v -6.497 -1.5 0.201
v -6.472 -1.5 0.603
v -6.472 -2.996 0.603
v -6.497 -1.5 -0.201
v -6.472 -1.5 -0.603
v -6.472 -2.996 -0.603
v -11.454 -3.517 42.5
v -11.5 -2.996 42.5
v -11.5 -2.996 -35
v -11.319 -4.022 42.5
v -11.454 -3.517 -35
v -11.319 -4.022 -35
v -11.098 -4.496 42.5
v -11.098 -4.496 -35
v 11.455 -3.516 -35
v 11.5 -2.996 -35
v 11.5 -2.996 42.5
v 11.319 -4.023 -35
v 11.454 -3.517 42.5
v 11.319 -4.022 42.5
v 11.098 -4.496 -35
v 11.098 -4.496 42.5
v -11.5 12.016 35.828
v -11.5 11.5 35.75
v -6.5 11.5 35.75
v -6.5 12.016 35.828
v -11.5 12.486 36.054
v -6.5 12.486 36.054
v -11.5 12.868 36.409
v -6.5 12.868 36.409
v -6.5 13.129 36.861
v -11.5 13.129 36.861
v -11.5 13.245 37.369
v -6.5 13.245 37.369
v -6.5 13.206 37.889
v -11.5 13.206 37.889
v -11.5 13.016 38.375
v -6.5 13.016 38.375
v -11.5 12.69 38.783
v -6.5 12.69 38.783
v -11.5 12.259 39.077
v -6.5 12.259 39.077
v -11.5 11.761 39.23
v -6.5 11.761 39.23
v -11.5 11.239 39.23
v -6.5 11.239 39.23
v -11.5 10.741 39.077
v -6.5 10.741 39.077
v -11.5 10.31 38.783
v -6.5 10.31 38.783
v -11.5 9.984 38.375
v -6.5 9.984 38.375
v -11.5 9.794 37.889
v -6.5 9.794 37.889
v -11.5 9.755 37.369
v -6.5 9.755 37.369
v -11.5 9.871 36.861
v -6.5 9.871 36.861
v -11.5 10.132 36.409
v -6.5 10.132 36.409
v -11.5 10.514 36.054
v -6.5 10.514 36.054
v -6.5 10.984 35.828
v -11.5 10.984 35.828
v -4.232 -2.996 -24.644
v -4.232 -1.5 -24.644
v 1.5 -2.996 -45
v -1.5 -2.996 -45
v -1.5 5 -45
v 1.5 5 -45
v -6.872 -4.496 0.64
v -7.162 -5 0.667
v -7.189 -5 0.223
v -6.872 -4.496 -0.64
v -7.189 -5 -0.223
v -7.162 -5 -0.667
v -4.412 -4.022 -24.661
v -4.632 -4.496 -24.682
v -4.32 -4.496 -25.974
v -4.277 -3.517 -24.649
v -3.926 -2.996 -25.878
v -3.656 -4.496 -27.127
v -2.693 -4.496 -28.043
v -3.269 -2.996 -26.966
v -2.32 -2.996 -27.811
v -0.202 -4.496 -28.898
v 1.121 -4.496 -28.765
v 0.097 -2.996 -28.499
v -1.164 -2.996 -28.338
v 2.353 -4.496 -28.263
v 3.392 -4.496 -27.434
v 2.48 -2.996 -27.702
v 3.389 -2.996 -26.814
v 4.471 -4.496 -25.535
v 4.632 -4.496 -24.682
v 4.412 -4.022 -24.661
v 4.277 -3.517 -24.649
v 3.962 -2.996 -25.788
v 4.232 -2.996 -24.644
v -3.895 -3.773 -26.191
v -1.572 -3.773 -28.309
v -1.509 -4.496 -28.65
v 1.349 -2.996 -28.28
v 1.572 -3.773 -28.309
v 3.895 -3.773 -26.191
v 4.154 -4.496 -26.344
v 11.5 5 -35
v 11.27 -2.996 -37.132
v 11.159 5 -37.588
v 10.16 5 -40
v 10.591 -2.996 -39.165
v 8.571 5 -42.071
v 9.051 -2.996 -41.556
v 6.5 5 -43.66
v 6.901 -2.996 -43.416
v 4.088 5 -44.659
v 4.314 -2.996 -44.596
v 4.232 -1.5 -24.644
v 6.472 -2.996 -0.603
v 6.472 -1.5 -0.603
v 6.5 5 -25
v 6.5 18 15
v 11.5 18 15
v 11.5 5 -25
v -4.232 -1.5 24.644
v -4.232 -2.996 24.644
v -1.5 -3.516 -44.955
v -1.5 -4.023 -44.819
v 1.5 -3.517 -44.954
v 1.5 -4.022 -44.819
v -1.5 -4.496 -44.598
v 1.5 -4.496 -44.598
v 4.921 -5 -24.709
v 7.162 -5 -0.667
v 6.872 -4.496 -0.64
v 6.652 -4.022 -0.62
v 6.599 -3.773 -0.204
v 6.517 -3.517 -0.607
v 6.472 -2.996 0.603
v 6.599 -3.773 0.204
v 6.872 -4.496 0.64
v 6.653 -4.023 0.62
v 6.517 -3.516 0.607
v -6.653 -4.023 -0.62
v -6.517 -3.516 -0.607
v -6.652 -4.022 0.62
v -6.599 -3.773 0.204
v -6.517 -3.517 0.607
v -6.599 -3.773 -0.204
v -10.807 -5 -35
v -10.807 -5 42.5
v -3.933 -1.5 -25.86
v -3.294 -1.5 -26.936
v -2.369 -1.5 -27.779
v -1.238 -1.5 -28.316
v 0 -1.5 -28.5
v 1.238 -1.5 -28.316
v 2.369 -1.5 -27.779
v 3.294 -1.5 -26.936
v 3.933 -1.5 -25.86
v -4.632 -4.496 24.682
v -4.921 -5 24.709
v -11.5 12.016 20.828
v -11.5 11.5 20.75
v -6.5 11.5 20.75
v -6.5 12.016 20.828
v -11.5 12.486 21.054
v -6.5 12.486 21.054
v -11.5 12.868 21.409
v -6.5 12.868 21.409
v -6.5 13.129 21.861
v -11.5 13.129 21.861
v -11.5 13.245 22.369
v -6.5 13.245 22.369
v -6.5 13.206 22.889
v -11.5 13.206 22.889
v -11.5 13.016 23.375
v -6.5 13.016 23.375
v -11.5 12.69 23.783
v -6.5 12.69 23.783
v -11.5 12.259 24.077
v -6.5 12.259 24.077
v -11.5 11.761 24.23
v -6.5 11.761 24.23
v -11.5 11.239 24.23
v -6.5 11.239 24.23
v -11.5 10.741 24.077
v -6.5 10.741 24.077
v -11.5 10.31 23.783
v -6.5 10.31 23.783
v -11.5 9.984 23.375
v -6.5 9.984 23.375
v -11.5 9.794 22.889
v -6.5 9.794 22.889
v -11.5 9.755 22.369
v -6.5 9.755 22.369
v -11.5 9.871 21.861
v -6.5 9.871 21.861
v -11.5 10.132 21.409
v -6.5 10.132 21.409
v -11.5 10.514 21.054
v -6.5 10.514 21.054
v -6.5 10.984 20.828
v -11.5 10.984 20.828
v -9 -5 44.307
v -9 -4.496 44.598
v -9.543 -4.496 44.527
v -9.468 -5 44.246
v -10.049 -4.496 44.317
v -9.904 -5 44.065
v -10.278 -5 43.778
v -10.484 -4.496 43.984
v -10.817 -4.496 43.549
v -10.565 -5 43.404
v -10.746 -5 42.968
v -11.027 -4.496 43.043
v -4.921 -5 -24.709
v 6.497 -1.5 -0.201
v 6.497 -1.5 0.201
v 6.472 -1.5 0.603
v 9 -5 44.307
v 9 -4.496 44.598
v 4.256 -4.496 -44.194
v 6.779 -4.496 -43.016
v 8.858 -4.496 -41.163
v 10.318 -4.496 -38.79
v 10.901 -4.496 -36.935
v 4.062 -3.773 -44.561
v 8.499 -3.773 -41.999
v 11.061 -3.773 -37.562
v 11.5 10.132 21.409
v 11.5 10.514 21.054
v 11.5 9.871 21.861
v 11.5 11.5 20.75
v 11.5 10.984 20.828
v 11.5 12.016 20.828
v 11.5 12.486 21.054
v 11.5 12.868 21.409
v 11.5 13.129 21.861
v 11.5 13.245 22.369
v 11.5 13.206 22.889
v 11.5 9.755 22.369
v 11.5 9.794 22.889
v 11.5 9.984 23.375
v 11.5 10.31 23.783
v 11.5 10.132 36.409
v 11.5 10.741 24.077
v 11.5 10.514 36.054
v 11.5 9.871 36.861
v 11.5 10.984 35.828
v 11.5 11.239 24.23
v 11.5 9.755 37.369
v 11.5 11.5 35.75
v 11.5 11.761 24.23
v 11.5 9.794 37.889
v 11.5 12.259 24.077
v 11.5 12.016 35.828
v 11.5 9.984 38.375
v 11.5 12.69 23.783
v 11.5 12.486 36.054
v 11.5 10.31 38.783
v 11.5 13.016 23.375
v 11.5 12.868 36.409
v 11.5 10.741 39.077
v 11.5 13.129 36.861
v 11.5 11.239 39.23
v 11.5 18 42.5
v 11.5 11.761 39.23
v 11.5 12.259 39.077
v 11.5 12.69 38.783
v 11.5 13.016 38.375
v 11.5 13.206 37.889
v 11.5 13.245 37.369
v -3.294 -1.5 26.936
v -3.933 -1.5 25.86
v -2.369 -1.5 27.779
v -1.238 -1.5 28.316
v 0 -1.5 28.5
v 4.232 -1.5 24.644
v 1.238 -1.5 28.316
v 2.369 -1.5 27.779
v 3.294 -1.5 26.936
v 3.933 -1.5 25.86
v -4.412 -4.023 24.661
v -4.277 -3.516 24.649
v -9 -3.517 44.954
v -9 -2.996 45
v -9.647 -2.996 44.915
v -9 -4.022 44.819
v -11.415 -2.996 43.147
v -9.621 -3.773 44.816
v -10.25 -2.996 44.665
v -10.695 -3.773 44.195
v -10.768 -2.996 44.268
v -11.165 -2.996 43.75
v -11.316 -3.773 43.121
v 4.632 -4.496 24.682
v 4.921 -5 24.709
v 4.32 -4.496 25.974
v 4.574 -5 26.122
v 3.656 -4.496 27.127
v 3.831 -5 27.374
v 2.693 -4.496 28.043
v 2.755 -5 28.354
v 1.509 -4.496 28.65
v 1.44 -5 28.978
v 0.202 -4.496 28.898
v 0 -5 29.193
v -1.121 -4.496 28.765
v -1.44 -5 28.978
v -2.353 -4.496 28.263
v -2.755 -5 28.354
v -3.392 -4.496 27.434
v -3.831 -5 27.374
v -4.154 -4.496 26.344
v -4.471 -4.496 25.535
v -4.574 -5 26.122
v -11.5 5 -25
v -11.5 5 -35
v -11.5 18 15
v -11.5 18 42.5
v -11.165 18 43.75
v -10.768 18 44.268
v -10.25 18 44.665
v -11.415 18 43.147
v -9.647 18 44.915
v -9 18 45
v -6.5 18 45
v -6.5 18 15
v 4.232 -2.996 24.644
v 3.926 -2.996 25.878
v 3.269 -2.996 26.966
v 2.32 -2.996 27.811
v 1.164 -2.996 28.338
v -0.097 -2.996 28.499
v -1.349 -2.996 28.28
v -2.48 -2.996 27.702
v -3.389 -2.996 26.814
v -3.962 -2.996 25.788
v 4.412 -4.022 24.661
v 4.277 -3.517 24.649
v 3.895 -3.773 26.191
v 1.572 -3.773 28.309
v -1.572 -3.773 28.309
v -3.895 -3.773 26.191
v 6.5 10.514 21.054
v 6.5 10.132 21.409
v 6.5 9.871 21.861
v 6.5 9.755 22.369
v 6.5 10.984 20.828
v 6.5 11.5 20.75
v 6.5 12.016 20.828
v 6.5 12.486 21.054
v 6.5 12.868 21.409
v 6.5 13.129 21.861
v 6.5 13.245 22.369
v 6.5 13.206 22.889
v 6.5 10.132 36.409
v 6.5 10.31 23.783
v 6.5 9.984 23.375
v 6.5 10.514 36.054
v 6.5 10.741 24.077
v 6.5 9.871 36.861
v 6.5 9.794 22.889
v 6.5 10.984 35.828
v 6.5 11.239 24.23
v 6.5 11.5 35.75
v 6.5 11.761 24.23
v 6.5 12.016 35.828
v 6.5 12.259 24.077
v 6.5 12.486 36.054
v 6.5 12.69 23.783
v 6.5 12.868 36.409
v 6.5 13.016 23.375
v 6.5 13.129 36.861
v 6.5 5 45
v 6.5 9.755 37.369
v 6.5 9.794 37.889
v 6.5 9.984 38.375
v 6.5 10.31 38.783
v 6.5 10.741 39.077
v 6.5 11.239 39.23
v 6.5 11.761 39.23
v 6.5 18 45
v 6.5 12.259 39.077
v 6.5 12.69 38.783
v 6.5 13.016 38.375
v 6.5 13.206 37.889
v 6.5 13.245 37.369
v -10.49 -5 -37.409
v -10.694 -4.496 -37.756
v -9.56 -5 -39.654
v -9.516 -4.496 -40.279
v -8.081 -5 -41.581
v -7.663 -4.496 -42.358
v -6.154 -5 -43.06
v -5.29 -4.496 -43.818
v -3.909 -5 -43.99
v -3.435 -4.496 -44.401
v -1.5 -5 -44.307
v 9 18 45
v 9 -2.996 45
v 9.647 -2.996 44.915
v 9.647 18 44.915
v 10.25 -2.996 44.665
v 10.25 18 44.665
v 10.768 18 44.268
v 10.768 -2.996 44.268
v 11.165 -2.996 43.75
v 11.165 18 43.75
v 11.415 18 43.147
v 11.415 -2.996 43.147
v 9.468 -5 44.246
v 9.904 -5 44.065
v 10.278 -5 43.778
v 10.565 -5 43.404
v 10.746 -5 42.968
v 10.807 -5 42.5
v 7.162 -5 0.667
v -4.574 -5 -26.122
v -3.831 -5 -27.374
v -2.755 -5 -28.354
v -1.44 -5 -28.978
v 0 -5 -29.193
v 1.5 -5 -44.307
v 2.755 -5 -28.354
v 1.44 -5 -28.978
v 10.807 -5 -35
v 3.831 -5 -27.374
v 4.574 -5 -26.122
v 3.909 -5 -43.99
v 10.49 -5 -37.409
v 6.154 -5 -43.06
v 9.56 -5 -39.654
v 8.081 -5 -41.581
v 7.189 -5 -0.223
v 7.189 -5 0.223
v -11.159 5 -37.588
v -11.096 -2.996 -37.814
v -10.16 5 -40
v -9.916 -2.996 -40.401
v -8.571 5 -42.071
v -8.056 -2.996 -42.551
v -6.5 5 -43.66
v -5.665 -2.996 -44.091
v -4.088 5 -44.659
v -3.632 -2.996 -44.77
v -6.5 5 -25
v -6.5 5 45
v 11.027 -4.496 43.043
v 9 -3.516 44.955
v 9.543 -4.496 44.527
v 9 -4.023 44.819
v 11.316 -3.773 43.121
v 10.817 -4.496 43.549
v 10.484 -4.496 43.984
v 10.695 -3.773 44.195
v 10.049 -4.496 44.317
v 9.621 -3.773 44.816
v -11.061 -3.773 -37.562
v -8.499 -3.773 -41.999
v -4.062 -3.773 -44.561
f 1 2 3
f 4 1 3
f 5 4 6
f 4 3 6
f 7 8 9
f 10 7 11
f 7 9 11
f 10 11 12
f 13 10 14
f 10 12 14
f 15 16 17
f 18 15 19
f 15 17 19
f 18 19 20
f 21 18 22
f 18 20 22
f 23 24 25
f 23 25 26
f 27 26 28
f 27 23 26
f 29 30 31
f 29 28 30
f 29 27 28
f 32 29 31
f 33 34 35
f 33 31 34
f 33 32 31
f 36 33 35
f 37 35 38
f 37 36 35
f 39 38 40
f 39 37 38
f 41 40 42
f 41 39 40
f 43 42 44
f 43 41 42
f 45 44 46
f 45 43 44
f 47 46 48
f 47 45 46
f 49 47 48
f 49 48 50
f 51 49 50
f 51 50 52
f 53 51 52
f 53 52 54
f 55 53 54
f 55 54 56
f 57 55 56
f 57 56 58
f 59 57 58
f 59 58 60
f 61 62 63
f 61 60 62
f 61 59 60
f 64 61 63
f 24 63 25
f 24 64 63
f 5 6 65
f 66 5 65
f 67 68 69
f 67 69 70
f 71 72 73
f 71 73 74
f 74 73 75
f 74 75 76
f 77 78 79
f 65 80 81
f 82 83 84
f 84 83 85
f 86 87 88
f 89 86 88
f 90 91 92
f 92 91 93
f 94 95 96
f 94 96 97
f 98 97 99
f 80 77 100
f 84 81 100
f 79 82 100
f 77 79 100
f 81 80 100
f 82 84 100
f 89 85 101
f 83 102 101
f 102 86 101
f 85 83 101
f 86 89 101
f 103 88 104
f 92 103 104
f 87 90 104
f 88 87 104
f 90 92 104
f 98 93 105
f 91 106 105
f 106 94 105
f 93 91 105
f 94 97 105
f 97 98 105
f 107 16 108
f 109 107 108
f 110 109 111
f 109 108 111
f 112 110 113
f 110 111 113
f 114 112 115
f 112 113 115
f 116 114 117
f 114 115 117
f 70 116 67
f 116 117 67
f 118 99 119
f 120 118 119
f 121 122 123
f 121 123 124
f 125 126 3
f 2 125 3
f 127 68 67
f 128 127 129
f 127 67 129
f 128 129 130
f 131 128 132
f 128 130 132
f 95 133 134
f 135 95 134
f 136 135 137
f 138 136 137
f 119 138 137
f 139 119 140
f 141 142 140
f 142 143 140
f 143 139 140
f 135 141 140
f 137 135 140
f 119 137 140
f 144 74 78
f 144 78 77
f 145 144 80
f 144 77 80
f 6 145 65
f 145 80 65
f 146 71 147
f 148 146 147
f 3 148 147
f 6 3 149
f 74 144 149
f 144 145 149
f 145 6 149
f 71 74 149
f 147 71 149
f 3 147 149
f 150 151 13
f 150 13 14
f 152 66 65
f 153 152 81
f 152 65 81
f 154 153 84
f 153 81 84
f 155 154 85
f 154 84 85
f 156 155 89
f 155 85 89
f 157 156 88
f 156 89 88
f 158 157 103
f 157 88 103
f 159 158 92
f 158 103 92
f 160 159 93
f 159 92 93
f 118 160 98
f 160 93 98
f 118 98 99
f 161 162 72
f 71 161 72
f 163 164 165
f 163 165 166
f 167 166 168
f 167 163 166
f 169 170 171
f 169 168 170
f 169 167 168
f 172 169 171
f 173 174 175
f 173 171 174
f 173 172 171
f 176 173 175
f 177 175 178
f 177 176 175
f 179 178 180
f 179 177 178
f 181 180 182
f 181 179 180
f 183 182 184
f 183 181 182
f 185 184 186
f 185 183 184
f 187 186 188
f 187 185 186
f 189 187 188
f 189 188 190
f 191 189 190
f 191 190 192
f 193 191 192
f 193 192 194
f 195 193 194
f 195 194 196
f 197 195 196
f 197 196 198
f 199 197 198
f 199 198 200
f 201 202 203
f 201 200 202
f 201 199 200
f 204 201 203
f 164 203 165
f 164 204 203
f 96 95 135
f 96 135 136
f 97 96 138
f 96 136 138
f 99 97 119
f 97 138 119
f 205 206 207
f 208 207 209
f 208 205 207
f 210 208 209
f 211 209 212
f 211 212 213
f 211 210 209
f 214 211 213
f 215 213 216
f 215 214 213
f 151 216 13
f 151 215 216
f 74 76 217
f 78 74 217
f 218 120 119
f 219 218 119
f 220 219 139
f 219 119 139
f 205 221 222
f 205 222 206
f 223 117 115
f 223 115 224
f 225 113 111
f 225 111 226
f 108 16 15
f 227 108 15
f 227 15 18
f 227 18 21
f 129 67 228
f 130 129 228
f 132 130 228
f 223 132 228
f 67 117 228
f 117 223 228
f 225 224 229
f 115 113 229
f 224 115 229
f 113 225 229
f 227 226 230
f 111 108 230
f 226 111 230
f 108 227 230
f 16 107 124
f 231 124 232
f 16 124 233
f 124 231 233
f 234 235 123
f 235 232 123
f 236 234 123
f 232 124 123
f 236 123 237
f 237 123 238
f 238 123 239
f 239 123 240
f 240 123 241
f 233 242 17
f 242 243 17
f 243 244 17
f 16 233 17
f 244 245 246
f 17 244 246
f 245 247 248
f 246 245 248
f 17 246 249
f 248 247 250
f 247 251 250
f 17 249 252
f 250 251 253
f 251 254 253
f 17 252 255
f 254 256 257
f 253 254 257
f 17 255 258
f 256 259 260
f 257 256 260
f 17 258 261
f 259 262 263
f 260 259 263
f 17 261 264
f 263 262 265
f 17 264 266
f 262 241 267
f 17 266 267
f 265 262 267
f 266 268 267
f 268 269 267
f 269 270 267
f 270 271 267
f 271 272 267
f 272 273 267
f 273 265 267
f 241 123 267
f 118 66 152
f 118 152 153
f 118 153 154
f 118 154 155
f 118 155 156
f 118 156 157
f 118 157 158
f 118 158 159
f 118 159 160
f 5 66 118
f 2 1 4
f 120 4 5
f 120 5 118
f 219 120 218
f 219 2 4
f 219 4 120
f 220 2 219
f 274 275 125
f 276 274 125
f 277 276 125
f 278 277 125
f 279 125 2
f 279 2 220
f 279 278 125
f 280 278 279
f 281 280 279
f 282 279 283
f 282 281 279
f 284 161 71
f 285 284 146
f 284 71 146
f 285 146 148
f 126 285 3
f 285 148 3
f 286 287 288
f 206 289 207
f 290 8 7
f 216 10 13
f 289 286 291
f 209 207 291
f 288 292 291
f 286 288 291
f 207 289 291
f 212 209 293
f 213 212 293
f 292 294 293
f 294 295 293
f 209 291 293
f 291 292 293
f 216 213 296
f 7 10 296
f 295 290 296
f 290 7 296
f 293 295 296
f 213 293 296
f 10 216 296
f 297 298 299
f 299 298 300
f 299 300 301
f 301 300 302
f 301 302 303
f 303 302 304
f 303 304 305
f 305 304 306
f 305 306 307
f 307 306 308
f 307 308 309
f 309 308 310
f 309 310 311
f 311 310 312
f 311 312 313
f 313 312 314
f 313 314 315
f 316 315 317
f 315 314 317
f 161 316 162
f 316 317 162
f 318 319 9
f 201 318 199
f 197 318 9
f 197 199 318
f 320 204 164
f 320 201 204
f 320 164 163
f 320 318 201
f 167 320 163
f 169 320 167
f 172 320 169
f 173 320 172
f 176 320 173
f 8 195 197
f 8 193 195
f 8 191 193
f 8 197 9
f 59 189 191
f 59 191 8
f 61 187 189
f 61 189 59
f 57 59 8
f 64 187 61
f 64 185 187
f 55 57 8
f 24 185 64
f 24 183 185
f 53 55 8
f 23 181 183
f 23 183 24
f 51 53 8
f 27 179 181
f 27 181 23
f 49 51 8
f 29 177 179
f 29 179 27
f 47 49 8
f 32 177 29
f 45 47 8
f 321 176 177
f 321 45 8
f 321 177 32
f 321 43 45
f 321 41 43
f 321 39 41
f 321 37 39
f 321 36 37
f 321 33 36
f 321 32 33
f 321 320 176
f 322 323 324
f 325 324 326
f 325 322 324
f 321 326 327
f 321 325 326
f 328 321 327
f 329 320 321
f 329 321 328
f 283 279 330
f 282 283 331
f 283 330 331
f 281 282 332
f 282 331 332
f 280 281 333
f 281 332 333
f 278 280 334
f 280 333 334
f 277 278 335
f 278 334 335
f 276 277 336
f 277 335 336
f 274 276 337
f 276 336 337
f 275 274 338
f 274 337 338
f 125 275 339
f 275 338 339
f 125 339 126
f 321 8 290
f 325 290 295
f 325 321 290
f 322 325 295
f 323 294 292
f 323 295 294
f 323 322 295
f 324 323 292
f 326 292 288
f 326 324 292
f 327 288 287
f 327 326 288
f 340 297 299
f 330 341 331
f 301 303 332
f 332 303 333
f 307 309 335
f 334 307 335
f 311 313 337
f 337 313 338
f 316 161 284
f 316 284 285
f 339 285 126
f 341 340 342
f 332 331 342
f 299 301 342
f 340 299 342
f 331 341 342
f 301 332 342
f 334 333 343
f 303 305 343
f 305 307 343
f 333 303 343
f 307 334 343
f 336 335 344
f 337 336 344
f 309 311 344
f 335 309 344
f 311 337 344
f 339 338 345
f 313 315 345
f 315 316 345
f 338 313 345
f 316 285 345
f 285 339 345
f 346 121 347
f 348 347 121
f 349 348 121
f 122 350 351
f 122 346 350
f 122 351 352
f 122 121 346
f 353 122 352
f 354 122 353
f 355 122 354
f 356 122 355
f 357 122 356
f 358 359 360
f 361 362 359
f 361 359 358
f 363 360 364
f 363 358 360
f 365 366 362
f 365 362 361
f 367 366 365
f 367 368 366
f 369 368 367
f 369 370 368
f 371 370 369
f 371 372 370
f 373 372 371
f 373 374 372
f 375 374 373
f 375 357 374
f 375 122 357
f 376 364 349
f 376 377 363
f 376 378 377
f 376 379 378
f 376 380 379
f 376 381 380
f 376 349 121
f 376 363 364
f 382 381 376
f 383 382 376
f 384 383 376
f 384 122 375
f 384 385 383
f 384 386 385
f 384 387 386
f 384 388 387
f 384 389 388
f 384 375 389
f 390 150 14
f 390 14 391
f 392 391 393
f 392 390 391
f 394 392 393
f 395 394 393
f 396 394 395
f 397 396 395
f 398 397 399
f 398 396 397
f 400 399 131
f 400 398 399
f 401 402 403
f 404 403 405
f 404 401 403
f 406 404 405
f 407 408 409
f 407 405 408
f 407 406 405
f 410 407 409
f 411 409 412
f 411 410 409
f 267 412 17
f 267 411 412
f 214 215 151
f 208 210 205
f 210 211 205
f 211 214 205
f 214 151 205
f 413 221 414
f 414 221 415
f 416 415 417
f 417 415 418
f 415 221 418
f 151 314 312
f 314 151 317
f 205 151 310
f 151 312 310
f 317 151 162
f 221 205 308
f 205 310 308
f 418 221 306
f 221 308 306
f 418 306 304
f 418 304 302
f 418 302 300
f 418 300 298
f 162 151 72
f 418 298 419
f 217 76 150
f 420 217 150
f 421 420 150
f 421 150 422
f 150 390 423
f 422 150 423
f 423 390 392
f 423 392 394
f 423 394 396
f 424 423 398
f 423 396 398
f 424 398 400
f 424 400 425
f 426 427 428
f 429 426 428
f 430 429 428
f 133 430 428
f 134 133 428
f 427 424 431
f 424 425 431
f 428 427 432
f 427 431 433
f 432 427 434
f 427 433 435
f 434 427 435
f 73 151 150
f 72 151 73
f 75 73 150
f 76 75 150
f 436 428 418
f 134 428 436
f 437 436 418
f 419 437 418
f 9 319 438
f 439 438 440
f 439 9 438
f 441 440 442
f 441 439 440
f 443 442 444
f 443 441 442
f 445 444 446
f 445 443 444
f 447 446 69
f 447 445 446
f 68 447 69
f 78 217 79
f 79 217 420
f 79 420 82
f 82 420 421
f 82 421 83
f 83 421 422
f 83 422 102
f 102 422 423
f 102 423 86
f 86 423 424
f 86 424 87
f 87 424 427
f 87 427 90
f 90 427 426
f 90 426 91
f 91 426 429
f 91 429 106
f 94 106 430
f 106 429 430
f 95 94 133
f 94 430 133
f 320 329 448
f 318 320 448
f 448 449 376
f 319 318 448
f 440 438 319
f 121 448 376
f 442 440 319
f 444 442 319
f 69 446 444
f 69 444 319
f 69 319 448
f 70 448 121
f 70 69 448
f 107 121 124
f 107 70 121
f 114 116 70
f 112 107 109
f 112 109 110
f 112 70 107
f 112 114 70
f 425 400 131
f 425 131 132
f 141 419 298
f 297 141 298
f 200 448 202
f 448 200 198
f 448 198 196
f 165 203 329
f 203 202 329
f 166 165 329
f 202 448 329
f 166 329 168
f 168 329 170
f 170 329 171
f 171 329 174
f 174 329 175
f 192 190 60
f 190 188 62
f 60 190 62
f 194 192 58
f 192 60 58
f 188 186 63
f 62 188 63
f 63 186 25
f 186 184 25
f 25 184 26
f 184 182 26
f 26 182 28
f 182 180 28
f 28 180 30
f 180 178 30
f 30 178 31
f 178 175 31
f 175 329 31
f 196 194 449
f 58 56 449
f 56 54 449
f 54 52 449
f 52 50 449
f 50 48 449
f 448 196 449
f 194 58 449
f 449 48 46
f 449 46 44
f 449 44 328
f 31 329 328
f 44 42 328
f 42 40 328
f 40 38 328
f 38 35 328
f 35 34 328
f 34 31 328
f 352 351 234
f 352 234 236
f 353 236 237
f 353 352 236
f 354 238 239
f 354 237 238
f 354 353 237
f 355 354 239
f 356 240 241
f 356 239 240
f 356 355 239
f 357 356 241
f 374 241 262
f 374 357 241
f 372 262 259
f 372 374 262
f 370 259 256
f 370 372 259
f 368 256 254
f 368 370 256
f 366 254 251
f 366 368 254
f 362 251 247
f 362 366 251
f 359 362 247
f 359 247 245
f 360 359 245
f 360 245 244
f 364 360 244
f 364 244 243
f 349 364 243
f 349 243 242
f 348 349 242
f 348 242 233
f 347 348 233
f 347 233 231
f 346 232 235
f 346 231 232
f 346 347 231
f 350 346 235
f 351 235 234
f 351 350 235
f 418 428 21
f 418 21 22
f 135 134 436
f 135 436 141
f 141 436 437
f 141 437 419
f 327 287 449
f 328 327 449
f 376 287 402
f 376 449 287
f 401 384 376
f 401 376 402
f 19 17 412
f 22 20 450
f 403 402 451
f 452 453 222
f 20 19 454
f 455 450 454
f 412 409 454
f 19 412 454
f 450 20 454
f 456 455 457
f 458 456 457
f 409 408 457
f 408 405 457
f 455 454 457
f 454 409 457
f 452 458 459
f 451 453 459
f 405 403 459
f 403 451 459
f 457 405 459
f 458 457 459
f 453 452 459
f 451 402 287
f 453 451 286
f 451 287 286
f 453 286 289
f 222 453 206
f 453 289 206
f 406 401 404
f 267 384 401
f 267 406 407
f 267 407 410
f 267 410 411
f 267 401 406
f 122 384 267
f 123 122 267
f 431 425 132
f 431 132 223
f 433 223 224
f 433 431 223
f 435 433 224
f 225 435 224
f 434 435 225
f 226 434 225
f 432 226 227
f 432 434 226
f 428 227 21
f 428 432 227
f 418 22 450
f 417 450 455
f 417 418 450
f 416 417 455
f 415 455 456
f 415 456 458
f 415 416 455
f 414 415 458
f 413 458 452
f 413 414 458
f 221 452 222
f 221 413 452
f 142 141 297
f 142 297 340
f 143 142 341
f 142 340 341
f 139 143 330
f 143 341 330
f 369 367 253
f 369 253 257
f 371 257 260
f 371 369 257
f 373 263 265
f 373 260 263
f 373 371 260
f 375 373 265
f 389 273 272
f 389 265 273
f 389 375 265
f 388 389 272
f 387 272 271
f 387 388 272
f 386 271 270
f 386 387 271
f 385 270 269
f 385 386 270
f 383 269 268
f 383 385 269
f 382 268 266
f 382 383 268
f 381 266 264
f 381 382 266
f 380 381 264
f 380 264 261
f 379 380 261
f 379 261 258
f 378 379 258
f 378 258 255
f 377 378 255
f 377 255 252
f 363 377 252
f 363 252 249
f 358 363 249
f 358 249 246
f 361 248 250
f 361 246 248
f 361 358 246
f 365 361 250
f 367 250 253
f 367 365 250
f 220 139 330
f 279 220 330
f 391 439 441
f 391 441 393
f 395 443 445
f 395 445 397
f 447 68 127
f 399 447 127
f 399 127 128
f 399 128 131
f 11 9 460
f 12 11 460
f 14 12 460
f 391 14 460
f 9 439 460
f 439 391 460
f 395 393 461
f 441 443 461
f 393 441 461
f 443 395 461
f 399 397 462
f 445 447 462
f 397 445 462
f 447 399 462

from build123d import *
from OCP.BRepFilletAPI import BRepFilletAPI_MakeChamfer

# Parameters (mm, degrees)
SKETCH_1_W               = 23
SKETCH_1_H               = 90
EXTRUDE_1_DEPTH          = 5
SKETCH_2_R               = 4.25
SKETCH_2_R_2             = 6.5
CUT_EXTRUDE_1_DEPTH      = 3.5
EXTRUDE_START            = 15
SKETCH_4_W               = 5
SKETCH_4_H               = 13
EXTRUDE_3_DEPTH          = 30
FILLET_2_R               = 10
CUT_EXTRUDE_2_DEPTH      = 50.812147113
CUT_EXTRUDE_2_DEPTH_BACK = 50.812147113
SKETCH_5_R               = 1.75
FILLET_3_R               = 2.5
EXTRUDE_START_2          = 6.5
EXTRUDE_4_DEPTH          = 5
CHAMFER_1_SIZE           = 1.2
CHAMFER_1_SIZE2          = 0.692820323
FILLET_4_R               = 3


with BuildPart() as part:
    # 스케치1 → 보스-돌출1 (new, symmetric)
    with BuildSketch(Plane(origin=(0, 0, 0), x_dir=(1, 0, 0), z_dir=(0, 1, 0))):
        Rectangle(SKETCH_1_W, SKETCH_1_H)
    extrude(amount=EXTRUDE_1_DEPTH, both=True)

    # 스케치2 → 컷-돌출1 (cut)
    with BuildSketch(Plane.XZ.offset(5)):
        with Locations((0, 24.25)):
            Circle(SKETCH_2_R)
        with BuildLine():
            ThreePointArc((4.25, 24.25), (-0.19737792, 20.004585773), (-4.231666803, 24.644329897))
            Line((-4.231666803, 24.644329897), (-6.471960993, 0.603092784))
            ThreePointArc((-6.471960993, 0.603092784), (0, 6.5), (6.471960993, 0.603092784))
            Line((6.471960993, 0.603092784), (4.231666803, 24.644329897))
            ThreePointArc((4.231666803, 24.644329897), (4.245414227, 24.44737792), (4.25, 24.25))
        make_face()
        Circle(SKETCH_2_R_2)
        with BuildLine():
            ThreePointArc((6.471960993, -0.603092784), (0, -6.5), (-6.471960993, -0.603092784))
            Line((-6.471960993, -0.603092784), (-4.231666803, -24.644329897))
            ThreePointArc((-4.231666803, -24.644329897), (-0.19737792, -20.004585773), (4.25, -24.25))
            ThreePointArc((4.25, -24.25), (4.245414227, -24.44737792), (4.231666803, -24.644329897))
            Line((4.231666803, -24.644329897), (6.471960993, -0.603092784))
        make_face()
        with Locations((0, -24.25)):
            Circle(SKETCH_2_R)
    extrude(amount=-CUT_EXTRUDE_1_DEPTH, mode=Mode.SUBTRACT)

    # 스케치4 → 보스-돌출3 (add)
    with BuildSketch(Plane.XY.offset(EXTRUDE_START)):
        with Locations((-9, 11.5)):
            Rectangle(SKETCH_4_W, SKETCH_4_H)
        with Locations((9, 11.5)):
            Rectangle(SKETCH_4_W, SKETCH_4_H)
    extrude(amount=EXTRUDE_3_DEPTH)

    # 필렛2
    fillet_2_edges = [part.edges().sort_by_distance(p)[0] for p in [
        (-11.5, 0, -45),
        (11.5, 0, -45),
    ]]
    fillet(fillet_2_edges, radius=FILLET_2_R)

    # 스케치5 → 컷-돌출2 (cut, two sides: drawn at the far end of the back side and taken through both)
    with BuildSketch(Plane(origin=(0, 0, 0), x_dir=(0, 0, -1), z_dir=(1, 0, 0)).offset(-CUT_EXTRUDE_2_DEPTH_BACK)):
        with Locations((-22.5, 11.5)):
            Circle(SKETCH_5_R)
        with Locations((-37.5, 11.5)):
            Circle(SKETCH_5_R)
    extrude(amount=CUT_EXTRUDE_2_DEPTH + CUT_EXTRUDE_2_DEPTH_BACK, mode=Mode.SUBTRACT)

    # 필렛3
    fillet_3_edges = [part.edges().sort_by_distance(p)[0] for p in [
        (11.5, 6.5, 45),
        (-11.5, 6.5, 45),
    ]]
    fillet(fillet_3_edges, radius=FILLET_3_R)

    # 스케치6 → 보스-돌출4 (add)
    with BuildSketch(Plane(origin=(0, 0, 0), x_dir=(0, 0, -1), z_dir=(1, 0, 0)).offset(EXTRUDE_START_2)):
        Polygon((-15, 18), (25, 5), (-15, 5), align=None)
    extrude_4 = extrude(amount=EXTRUDE_4_DEPTH)

    # 대칭 복사1: 보스-돌출4 across plane
    add(extrude_4.mirror(Plane(origin=(0, 0, 0), x_dir=(0, 0, 1), z_dir=(1, 0, 0))))

    # 모따기1: one chamfer whose edges measure the first distance from different faces: ONE call of the kernel's chamfer builder (chamfer() names one face for all edges)
    chamfer_1_edges_1 = [part.edges().sort_by_distance(p)[0] for p in [
        (5.351813898, -5, 12.62371134),
    ]]
    chamfer_1_side_1 = [part.faces().sort_by_distance(p)[0] for p in [
        (5.351813898, -3.25, 12.62371134),
    ]]
    chamfer_1_edges_2 = [part.edges().sort_by_distance(p)[0] for p in [
        (5.351813898, -5, -12.62371134),
    ]]
    chamfer_1_side_2 = [part.faces().sort_by_distance(p)[0] for p in [
        (5.351813898, -3.25, -12.62371134),
    ]]
    chamfer_1_edges_3 = [part.edges().sort_by_distance(p)[0] for p in [
        (0, -5, 28.5),
    ]]
    chamfer_1_side_3 = [part.faces().sort_by_distance(p)[0] for p in [
        (0, -3.25, 28.5),
    ]]
    chamfer_1_edges_4 = [part.edges().sort_by_distance(p)[0] for p in [
        (-5.351813898, -5, 12.62371134),
    ]]
    chamfer_1_side_4 = [part.faces().sort_by_distance(p)[0] for p in [
        (-5.351813898, -3.25, 12.62371134),
    ]]
    chamfer_1_edges_5 = [part.edges().sort_by_distance(p)[0] for p in [
        (-6.5, -5, 0),
    ]]
    chamfer_1_side_5 = [part.faces().sort_by_distance(p)[0] for p in [
        (-6.5, -3.25, 0),
    ]]
    chamfer_1_edges_6 = [part.edges().sort_by_distance(p)[0] for p in [
        (-5.351813898, -5, -12.62371134),
    ]]
    chamfer_1_side_6 = [part.faces().sort_by_distance(p)[0] for p in [
        (-5.351813898, -3.25, -12.62371134),
    ]]
    chamfer_1_edges_7 = [part.edges().sort_by_distance(p)[0] for p in [
        (0, -5, -28.5),
    ]]
    chamfer_1_side_7 = [part.faces().sort_by_distance(p)[0] for p in [
        (0, -3.25, -28.5),
    ]]
    chamfer_1_edges_8 = [part.edges().sort_by_distance(p)[0] for p in [
        (6.5, -5, 0),
    ]]
    chamfer_1_side_8 = [part.faces().sort_by_distance(p)[0] for p in [
        (6.5, -3.25, 0),
    ]]
    chamfer_1_edges_9 = [part.edges().sort_by_distance(p)[0] for p in [
        (0, -5, -45),
    ]]
    chamfer_1_side_9 = [part.faces().sort_by_distance(p)[0] for p in [
        (0, 0, -45),
    ]]
    chamfer_1_edges_10 = [part.edges().sort_by_distance(p)[0] for p in [
        (-11.5, -5, 3.75),
    ]]
    chamfer_1_side_10 = [part.faces().sort_by_distance(p)[0] for p in [
        (-11.5, 4.599741569, 9.495989177),
    ]]
    chamfer_1_edges_11 = [part.edges().sort_by_distance(p)[0] for p in [
        (-8.571067812, -5, -42.071067812),
    ]]
    chamfer_1_side_11 = [part.faces().sort_by_distance(p)[0] for p in [
        (-8.571067812, 0, -42.071067812),
    ]]
    chamfer_1_edges_12 = [part.edges().sort_by_distance(p)[0] for p in [
        (8.571067812, -5, -42.071067812),
    ]]
    chamfer_1_side_12 = [part.faces().sort_by_distance(p)[0] for p in [
        (8.571067812, 0, -42.071067812),
    ]]
    chamfer_1_edges_13 = [part.edges().sort_by_distance(p)[0] for p in [
        (0, -5, 45),
    ]]
    chamfer_1_side_13 = [part.faces().sort_by_distance(p)[0] for p in [
        (0, 3.051020408, 45),
    ]]
    chamfer_1_edges_14 = [part.edges().sort_by_distance(p)[0] for p in [
        (11.5, -5, 3.75),
    ]]
    chamfer_1_side_14 = [part.faces().sort_by_distance(p)[0] for p in [
        (11.5, 4.599741569, 9.495989177),
    ]]
    chamfer_1_edges_15 = [part.edges().sort_by_distance(p)[0] for p in [
        (10.767766953, -5, 44.267766953),
    ]]
    chamfer_1_side_15 = [part.faces().sort_by_distance(p)[0] for p in [
        (10.767766953, 6.5, 44.267766953),
    ]]
    chamfer_1_edges_16 = [part.edges().sort_by_distance(p)[0] for p in [
        (-10.767766953, -5, 44.267766953),
    ]]
    chamfer_1_side_16 = [part.faces().sort_by_distance(p)[0] for p in [
        (-10.767766953, 6.5, 44.267766953),
    ]]
    chamfer_1 = BRepFilletAPI_MakeChamfer(part.part.solid().wrapped)
    for e in chamfer_1_edges_1:
        chamfer_1.Add(CHAMFER_1_SIZE, CHAMFER_1_SIZE2, e.wrapped, chamfer_1_side_1[0].wrapped)  # the first distance lies on this face
    for e in chamfer_1_edges_2:
        chamfer_1.Add(CHAMFER_1_SIZE, CHAMFER_1_SIZE2, e.wrapped, chamfer_1_side_2[0].wrapped)  # the first distance lies on this face
    for e in chamfer_1_edges_3:
        chamfer_1.Add(CHAMFER_1_SIZE, CHAMFER_1_SIZE2, e.wrapped, chamfer_1_side_3[0].wrapped)  # the first distance lies on this face
    for e in chamfer_1_edges_4:
        chamfer_1.Add(CHAMFER_1_SIZE, CHAMFER_1_SIZE2, e.wrapped, chamfer_1_side_4[0].wrapped)  # the first distance lies on this face
    for e in chamfer_1_edges_5:
        chamfer_1.Add(CHAMFER_1_SIZE, CHAMFER_1_SIZE2, e.wrapped, chamfer_1_side_5[0].wrapped)  # the first distance lies on this face
    for e in chamfer_1_edges_6:
        chamfer_1.Add(CHAMFER_1_SIZE, CHAMFER_1_SIZE2, e.wrapped, chamfer_1_side_6[0].wrapped)  # the first distance lies on this face
    for e in chamfer_1_edges_7:
        chamfer_1.Add(CHAMFER_1_SIZE, CHAMFER_1_SIZE2, e.wrapped, chamfer_1_side_7[0].wrapped)  # the first distance lies on this face
    for e in chamfer_1_edges_8:
        chamfer_1.Add(CHAMFER_1_SIZE, CHAMFER_1_SIZE2, e.wrapped, chamfer_1_side_8[0].wrapped)  # the first distance lies on this face
    for e in chamfer_1_edges_9:
        chamfer_1.Add(CHAMFER_1_SIZE, CHAMFER_1_SIZE2, e.wrapped, chamfer_1_side_9[0].wrapped)  # the first distance lies on this face
    for e in chamfer_1_edges_10:
        chamfer_1.Add(CHAMFER_1_SIZE, CHAMFER_1_SIZE2, e.wrapped, chamfer_1_side_10[0].wrapped)  # the first distance lies on this face
    for e in chamfer_1_edges_11:
        chamfer_1.Add(CHAMFER_1_SIZE, CHAMFER_1_SIZE2, e.wrapped, chamfer_1_side_11[0].wrapped)  # the first distance lies on this face
    for e in chamfer_1_edges_12:
        chamfer_1.Add(CHAMFER_1_SIZE, CHAMFER_1_SIZE2, e.wrapped, chamfer_1_side_12[0].wrapped)  # the first distance lies on this face
    for e in chamfer_1_edges_13:
        chamfer_1.Add(CHAMFER_1_SIZE, CHAMFER_1_SIZE2, e.wrapped, chamfer_1_side_13[0].wrapped)  # the first distance lies on this face
    for e in chamfer_1_edges_14:
        chamfer_1.Add(CHAMFER_1_SIZE, CHAMFER_1_SIZE2, e.wrapped, chamfer_1_side_14[0].wrapped)  # the first distance lies on this face
    for e in chamfer_1_edges_15:
        chamfer_1.Add(CHAMFER_1_SIZE, CHAMFER_1_SIZE2, e.wrapped, chamfer_1_side_15[0].wrapped)  # the first distance lies on this face
    for e in chamfer_1_edges_16:
        chamfer_1.Add(CHAMFER_1_SIZE, CHAMFER_1_SIZE2, e.wrapped, chamfer_1_side_16[0].wrapped)  # the first distance lies on this face
    add(Compound.cast(chamfer_1.Shape()), mode=Mode.REPLACE)

    # 필렛4
    fillet_4_edges = [part.edges().sort_by_distance(p)[0] for p in [
        (5.351813898, -3.8, -12.62371134),
        (6.5, -3.8, 0),
        (0, -3.8, -28.5),
        (5.351813898, -3.8, 12.62371134),
        (-5.351813898, -3.8, -12.62371134),
        (0, -3.8, 28.5),
        (-6.5, -3.8, 0),
        (-5.351813898, -3.8, 12.62371134),
        (-11.5, -3.8, 3.75),
        (-10.767766953, -3.8, 44.267766953),
        (-8.571067812, -3.8, -42.071067812),
        (0, -3.8, 45),
        (0, -3.8, -45),
        (10.767766953, -3.8, 44.267766953),
        (8.571067812, -3.8, -42.071067812),
        (11.5, -3.8, 3.75),
    ]]
    fillet(fillet_4_edges, radius=FILLET_4_R)


solid = part.part
